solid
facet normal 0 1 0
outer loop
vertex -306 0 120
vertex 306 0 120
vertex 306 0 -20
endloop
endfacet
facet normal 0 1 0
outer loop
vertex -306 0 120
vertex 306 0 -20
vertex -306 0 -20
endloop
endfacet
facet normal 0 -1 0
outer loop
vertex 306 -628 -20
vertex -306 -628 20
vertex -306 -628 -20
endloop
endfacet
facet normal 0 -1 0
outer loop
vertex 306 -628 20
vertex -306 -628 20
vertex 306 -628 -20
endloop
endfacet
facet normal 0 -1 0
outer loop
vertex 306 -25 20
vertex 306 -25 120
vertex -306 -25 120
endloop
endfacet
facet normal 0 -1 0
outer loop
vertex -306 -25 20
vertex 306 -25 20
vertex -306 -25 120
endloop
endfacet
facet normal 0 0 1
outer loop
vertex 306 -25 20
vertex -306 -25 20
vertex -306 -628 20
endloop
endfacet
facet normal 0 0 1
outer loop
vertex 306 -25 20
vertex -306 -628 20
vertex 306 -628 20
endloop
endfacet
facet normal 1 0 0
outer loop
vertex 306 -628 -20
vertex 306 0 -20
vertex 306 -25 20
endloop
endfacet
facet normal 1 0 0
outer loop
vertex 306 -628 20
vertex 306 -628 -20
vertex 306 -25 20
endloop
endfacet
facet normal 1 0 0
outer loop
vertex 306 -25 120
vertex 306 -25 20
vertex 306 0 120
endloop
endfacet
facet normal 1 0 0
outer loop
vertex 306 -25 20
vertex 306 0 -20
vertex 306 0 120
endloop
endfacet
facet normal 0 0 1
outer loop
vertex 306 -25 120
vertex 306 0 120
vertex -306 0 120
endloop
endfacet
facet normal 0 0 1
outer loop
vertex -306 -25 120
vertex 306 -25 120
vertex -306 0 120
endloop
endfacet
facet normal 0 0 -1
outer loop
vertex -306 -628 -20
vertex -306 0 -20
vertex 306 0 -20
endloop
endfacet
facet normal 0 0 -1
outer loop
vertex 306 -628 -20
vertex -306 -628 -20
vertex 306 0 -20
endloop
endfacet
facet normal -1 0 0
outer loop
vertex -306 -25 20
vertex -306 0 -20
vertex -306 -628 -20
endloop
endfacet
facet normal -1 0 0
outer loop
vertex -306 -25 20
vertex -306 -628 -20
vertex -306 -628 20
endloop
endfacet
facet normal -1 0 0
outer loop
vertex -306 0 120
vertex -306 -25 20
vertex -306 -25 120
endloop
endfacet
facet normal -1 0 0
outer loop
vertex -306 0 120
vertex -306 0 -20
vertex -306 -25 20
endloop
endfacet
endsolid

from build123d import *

# Parameters (mm, degrees)
F0_W     = 612
F0_H     = 40
F1_DEPTH = 628
F2_W     = 612
F2_H     = 100
F3_DEPTH = 25


with BuildPart() as f1:
    # F0 (on Front) → F1 (new body)
    with BuildSketch(Plane.XZ):
        Rectangle(F0_W, F0_H)
    extrude(amount=F1_DEPTH)

    # F2 (on face) → F3 (join)
    with BuildSketch(Plane(origin=(0, 0, 0), x_dir=(-1, 0, 0), z_dir=(0, 1, 0))):
        with Locations((0, 70)):
            Rectangle(F2_W, F2_H)
    extrude(amount=-F3_DEPTH)


solid = f1.part
